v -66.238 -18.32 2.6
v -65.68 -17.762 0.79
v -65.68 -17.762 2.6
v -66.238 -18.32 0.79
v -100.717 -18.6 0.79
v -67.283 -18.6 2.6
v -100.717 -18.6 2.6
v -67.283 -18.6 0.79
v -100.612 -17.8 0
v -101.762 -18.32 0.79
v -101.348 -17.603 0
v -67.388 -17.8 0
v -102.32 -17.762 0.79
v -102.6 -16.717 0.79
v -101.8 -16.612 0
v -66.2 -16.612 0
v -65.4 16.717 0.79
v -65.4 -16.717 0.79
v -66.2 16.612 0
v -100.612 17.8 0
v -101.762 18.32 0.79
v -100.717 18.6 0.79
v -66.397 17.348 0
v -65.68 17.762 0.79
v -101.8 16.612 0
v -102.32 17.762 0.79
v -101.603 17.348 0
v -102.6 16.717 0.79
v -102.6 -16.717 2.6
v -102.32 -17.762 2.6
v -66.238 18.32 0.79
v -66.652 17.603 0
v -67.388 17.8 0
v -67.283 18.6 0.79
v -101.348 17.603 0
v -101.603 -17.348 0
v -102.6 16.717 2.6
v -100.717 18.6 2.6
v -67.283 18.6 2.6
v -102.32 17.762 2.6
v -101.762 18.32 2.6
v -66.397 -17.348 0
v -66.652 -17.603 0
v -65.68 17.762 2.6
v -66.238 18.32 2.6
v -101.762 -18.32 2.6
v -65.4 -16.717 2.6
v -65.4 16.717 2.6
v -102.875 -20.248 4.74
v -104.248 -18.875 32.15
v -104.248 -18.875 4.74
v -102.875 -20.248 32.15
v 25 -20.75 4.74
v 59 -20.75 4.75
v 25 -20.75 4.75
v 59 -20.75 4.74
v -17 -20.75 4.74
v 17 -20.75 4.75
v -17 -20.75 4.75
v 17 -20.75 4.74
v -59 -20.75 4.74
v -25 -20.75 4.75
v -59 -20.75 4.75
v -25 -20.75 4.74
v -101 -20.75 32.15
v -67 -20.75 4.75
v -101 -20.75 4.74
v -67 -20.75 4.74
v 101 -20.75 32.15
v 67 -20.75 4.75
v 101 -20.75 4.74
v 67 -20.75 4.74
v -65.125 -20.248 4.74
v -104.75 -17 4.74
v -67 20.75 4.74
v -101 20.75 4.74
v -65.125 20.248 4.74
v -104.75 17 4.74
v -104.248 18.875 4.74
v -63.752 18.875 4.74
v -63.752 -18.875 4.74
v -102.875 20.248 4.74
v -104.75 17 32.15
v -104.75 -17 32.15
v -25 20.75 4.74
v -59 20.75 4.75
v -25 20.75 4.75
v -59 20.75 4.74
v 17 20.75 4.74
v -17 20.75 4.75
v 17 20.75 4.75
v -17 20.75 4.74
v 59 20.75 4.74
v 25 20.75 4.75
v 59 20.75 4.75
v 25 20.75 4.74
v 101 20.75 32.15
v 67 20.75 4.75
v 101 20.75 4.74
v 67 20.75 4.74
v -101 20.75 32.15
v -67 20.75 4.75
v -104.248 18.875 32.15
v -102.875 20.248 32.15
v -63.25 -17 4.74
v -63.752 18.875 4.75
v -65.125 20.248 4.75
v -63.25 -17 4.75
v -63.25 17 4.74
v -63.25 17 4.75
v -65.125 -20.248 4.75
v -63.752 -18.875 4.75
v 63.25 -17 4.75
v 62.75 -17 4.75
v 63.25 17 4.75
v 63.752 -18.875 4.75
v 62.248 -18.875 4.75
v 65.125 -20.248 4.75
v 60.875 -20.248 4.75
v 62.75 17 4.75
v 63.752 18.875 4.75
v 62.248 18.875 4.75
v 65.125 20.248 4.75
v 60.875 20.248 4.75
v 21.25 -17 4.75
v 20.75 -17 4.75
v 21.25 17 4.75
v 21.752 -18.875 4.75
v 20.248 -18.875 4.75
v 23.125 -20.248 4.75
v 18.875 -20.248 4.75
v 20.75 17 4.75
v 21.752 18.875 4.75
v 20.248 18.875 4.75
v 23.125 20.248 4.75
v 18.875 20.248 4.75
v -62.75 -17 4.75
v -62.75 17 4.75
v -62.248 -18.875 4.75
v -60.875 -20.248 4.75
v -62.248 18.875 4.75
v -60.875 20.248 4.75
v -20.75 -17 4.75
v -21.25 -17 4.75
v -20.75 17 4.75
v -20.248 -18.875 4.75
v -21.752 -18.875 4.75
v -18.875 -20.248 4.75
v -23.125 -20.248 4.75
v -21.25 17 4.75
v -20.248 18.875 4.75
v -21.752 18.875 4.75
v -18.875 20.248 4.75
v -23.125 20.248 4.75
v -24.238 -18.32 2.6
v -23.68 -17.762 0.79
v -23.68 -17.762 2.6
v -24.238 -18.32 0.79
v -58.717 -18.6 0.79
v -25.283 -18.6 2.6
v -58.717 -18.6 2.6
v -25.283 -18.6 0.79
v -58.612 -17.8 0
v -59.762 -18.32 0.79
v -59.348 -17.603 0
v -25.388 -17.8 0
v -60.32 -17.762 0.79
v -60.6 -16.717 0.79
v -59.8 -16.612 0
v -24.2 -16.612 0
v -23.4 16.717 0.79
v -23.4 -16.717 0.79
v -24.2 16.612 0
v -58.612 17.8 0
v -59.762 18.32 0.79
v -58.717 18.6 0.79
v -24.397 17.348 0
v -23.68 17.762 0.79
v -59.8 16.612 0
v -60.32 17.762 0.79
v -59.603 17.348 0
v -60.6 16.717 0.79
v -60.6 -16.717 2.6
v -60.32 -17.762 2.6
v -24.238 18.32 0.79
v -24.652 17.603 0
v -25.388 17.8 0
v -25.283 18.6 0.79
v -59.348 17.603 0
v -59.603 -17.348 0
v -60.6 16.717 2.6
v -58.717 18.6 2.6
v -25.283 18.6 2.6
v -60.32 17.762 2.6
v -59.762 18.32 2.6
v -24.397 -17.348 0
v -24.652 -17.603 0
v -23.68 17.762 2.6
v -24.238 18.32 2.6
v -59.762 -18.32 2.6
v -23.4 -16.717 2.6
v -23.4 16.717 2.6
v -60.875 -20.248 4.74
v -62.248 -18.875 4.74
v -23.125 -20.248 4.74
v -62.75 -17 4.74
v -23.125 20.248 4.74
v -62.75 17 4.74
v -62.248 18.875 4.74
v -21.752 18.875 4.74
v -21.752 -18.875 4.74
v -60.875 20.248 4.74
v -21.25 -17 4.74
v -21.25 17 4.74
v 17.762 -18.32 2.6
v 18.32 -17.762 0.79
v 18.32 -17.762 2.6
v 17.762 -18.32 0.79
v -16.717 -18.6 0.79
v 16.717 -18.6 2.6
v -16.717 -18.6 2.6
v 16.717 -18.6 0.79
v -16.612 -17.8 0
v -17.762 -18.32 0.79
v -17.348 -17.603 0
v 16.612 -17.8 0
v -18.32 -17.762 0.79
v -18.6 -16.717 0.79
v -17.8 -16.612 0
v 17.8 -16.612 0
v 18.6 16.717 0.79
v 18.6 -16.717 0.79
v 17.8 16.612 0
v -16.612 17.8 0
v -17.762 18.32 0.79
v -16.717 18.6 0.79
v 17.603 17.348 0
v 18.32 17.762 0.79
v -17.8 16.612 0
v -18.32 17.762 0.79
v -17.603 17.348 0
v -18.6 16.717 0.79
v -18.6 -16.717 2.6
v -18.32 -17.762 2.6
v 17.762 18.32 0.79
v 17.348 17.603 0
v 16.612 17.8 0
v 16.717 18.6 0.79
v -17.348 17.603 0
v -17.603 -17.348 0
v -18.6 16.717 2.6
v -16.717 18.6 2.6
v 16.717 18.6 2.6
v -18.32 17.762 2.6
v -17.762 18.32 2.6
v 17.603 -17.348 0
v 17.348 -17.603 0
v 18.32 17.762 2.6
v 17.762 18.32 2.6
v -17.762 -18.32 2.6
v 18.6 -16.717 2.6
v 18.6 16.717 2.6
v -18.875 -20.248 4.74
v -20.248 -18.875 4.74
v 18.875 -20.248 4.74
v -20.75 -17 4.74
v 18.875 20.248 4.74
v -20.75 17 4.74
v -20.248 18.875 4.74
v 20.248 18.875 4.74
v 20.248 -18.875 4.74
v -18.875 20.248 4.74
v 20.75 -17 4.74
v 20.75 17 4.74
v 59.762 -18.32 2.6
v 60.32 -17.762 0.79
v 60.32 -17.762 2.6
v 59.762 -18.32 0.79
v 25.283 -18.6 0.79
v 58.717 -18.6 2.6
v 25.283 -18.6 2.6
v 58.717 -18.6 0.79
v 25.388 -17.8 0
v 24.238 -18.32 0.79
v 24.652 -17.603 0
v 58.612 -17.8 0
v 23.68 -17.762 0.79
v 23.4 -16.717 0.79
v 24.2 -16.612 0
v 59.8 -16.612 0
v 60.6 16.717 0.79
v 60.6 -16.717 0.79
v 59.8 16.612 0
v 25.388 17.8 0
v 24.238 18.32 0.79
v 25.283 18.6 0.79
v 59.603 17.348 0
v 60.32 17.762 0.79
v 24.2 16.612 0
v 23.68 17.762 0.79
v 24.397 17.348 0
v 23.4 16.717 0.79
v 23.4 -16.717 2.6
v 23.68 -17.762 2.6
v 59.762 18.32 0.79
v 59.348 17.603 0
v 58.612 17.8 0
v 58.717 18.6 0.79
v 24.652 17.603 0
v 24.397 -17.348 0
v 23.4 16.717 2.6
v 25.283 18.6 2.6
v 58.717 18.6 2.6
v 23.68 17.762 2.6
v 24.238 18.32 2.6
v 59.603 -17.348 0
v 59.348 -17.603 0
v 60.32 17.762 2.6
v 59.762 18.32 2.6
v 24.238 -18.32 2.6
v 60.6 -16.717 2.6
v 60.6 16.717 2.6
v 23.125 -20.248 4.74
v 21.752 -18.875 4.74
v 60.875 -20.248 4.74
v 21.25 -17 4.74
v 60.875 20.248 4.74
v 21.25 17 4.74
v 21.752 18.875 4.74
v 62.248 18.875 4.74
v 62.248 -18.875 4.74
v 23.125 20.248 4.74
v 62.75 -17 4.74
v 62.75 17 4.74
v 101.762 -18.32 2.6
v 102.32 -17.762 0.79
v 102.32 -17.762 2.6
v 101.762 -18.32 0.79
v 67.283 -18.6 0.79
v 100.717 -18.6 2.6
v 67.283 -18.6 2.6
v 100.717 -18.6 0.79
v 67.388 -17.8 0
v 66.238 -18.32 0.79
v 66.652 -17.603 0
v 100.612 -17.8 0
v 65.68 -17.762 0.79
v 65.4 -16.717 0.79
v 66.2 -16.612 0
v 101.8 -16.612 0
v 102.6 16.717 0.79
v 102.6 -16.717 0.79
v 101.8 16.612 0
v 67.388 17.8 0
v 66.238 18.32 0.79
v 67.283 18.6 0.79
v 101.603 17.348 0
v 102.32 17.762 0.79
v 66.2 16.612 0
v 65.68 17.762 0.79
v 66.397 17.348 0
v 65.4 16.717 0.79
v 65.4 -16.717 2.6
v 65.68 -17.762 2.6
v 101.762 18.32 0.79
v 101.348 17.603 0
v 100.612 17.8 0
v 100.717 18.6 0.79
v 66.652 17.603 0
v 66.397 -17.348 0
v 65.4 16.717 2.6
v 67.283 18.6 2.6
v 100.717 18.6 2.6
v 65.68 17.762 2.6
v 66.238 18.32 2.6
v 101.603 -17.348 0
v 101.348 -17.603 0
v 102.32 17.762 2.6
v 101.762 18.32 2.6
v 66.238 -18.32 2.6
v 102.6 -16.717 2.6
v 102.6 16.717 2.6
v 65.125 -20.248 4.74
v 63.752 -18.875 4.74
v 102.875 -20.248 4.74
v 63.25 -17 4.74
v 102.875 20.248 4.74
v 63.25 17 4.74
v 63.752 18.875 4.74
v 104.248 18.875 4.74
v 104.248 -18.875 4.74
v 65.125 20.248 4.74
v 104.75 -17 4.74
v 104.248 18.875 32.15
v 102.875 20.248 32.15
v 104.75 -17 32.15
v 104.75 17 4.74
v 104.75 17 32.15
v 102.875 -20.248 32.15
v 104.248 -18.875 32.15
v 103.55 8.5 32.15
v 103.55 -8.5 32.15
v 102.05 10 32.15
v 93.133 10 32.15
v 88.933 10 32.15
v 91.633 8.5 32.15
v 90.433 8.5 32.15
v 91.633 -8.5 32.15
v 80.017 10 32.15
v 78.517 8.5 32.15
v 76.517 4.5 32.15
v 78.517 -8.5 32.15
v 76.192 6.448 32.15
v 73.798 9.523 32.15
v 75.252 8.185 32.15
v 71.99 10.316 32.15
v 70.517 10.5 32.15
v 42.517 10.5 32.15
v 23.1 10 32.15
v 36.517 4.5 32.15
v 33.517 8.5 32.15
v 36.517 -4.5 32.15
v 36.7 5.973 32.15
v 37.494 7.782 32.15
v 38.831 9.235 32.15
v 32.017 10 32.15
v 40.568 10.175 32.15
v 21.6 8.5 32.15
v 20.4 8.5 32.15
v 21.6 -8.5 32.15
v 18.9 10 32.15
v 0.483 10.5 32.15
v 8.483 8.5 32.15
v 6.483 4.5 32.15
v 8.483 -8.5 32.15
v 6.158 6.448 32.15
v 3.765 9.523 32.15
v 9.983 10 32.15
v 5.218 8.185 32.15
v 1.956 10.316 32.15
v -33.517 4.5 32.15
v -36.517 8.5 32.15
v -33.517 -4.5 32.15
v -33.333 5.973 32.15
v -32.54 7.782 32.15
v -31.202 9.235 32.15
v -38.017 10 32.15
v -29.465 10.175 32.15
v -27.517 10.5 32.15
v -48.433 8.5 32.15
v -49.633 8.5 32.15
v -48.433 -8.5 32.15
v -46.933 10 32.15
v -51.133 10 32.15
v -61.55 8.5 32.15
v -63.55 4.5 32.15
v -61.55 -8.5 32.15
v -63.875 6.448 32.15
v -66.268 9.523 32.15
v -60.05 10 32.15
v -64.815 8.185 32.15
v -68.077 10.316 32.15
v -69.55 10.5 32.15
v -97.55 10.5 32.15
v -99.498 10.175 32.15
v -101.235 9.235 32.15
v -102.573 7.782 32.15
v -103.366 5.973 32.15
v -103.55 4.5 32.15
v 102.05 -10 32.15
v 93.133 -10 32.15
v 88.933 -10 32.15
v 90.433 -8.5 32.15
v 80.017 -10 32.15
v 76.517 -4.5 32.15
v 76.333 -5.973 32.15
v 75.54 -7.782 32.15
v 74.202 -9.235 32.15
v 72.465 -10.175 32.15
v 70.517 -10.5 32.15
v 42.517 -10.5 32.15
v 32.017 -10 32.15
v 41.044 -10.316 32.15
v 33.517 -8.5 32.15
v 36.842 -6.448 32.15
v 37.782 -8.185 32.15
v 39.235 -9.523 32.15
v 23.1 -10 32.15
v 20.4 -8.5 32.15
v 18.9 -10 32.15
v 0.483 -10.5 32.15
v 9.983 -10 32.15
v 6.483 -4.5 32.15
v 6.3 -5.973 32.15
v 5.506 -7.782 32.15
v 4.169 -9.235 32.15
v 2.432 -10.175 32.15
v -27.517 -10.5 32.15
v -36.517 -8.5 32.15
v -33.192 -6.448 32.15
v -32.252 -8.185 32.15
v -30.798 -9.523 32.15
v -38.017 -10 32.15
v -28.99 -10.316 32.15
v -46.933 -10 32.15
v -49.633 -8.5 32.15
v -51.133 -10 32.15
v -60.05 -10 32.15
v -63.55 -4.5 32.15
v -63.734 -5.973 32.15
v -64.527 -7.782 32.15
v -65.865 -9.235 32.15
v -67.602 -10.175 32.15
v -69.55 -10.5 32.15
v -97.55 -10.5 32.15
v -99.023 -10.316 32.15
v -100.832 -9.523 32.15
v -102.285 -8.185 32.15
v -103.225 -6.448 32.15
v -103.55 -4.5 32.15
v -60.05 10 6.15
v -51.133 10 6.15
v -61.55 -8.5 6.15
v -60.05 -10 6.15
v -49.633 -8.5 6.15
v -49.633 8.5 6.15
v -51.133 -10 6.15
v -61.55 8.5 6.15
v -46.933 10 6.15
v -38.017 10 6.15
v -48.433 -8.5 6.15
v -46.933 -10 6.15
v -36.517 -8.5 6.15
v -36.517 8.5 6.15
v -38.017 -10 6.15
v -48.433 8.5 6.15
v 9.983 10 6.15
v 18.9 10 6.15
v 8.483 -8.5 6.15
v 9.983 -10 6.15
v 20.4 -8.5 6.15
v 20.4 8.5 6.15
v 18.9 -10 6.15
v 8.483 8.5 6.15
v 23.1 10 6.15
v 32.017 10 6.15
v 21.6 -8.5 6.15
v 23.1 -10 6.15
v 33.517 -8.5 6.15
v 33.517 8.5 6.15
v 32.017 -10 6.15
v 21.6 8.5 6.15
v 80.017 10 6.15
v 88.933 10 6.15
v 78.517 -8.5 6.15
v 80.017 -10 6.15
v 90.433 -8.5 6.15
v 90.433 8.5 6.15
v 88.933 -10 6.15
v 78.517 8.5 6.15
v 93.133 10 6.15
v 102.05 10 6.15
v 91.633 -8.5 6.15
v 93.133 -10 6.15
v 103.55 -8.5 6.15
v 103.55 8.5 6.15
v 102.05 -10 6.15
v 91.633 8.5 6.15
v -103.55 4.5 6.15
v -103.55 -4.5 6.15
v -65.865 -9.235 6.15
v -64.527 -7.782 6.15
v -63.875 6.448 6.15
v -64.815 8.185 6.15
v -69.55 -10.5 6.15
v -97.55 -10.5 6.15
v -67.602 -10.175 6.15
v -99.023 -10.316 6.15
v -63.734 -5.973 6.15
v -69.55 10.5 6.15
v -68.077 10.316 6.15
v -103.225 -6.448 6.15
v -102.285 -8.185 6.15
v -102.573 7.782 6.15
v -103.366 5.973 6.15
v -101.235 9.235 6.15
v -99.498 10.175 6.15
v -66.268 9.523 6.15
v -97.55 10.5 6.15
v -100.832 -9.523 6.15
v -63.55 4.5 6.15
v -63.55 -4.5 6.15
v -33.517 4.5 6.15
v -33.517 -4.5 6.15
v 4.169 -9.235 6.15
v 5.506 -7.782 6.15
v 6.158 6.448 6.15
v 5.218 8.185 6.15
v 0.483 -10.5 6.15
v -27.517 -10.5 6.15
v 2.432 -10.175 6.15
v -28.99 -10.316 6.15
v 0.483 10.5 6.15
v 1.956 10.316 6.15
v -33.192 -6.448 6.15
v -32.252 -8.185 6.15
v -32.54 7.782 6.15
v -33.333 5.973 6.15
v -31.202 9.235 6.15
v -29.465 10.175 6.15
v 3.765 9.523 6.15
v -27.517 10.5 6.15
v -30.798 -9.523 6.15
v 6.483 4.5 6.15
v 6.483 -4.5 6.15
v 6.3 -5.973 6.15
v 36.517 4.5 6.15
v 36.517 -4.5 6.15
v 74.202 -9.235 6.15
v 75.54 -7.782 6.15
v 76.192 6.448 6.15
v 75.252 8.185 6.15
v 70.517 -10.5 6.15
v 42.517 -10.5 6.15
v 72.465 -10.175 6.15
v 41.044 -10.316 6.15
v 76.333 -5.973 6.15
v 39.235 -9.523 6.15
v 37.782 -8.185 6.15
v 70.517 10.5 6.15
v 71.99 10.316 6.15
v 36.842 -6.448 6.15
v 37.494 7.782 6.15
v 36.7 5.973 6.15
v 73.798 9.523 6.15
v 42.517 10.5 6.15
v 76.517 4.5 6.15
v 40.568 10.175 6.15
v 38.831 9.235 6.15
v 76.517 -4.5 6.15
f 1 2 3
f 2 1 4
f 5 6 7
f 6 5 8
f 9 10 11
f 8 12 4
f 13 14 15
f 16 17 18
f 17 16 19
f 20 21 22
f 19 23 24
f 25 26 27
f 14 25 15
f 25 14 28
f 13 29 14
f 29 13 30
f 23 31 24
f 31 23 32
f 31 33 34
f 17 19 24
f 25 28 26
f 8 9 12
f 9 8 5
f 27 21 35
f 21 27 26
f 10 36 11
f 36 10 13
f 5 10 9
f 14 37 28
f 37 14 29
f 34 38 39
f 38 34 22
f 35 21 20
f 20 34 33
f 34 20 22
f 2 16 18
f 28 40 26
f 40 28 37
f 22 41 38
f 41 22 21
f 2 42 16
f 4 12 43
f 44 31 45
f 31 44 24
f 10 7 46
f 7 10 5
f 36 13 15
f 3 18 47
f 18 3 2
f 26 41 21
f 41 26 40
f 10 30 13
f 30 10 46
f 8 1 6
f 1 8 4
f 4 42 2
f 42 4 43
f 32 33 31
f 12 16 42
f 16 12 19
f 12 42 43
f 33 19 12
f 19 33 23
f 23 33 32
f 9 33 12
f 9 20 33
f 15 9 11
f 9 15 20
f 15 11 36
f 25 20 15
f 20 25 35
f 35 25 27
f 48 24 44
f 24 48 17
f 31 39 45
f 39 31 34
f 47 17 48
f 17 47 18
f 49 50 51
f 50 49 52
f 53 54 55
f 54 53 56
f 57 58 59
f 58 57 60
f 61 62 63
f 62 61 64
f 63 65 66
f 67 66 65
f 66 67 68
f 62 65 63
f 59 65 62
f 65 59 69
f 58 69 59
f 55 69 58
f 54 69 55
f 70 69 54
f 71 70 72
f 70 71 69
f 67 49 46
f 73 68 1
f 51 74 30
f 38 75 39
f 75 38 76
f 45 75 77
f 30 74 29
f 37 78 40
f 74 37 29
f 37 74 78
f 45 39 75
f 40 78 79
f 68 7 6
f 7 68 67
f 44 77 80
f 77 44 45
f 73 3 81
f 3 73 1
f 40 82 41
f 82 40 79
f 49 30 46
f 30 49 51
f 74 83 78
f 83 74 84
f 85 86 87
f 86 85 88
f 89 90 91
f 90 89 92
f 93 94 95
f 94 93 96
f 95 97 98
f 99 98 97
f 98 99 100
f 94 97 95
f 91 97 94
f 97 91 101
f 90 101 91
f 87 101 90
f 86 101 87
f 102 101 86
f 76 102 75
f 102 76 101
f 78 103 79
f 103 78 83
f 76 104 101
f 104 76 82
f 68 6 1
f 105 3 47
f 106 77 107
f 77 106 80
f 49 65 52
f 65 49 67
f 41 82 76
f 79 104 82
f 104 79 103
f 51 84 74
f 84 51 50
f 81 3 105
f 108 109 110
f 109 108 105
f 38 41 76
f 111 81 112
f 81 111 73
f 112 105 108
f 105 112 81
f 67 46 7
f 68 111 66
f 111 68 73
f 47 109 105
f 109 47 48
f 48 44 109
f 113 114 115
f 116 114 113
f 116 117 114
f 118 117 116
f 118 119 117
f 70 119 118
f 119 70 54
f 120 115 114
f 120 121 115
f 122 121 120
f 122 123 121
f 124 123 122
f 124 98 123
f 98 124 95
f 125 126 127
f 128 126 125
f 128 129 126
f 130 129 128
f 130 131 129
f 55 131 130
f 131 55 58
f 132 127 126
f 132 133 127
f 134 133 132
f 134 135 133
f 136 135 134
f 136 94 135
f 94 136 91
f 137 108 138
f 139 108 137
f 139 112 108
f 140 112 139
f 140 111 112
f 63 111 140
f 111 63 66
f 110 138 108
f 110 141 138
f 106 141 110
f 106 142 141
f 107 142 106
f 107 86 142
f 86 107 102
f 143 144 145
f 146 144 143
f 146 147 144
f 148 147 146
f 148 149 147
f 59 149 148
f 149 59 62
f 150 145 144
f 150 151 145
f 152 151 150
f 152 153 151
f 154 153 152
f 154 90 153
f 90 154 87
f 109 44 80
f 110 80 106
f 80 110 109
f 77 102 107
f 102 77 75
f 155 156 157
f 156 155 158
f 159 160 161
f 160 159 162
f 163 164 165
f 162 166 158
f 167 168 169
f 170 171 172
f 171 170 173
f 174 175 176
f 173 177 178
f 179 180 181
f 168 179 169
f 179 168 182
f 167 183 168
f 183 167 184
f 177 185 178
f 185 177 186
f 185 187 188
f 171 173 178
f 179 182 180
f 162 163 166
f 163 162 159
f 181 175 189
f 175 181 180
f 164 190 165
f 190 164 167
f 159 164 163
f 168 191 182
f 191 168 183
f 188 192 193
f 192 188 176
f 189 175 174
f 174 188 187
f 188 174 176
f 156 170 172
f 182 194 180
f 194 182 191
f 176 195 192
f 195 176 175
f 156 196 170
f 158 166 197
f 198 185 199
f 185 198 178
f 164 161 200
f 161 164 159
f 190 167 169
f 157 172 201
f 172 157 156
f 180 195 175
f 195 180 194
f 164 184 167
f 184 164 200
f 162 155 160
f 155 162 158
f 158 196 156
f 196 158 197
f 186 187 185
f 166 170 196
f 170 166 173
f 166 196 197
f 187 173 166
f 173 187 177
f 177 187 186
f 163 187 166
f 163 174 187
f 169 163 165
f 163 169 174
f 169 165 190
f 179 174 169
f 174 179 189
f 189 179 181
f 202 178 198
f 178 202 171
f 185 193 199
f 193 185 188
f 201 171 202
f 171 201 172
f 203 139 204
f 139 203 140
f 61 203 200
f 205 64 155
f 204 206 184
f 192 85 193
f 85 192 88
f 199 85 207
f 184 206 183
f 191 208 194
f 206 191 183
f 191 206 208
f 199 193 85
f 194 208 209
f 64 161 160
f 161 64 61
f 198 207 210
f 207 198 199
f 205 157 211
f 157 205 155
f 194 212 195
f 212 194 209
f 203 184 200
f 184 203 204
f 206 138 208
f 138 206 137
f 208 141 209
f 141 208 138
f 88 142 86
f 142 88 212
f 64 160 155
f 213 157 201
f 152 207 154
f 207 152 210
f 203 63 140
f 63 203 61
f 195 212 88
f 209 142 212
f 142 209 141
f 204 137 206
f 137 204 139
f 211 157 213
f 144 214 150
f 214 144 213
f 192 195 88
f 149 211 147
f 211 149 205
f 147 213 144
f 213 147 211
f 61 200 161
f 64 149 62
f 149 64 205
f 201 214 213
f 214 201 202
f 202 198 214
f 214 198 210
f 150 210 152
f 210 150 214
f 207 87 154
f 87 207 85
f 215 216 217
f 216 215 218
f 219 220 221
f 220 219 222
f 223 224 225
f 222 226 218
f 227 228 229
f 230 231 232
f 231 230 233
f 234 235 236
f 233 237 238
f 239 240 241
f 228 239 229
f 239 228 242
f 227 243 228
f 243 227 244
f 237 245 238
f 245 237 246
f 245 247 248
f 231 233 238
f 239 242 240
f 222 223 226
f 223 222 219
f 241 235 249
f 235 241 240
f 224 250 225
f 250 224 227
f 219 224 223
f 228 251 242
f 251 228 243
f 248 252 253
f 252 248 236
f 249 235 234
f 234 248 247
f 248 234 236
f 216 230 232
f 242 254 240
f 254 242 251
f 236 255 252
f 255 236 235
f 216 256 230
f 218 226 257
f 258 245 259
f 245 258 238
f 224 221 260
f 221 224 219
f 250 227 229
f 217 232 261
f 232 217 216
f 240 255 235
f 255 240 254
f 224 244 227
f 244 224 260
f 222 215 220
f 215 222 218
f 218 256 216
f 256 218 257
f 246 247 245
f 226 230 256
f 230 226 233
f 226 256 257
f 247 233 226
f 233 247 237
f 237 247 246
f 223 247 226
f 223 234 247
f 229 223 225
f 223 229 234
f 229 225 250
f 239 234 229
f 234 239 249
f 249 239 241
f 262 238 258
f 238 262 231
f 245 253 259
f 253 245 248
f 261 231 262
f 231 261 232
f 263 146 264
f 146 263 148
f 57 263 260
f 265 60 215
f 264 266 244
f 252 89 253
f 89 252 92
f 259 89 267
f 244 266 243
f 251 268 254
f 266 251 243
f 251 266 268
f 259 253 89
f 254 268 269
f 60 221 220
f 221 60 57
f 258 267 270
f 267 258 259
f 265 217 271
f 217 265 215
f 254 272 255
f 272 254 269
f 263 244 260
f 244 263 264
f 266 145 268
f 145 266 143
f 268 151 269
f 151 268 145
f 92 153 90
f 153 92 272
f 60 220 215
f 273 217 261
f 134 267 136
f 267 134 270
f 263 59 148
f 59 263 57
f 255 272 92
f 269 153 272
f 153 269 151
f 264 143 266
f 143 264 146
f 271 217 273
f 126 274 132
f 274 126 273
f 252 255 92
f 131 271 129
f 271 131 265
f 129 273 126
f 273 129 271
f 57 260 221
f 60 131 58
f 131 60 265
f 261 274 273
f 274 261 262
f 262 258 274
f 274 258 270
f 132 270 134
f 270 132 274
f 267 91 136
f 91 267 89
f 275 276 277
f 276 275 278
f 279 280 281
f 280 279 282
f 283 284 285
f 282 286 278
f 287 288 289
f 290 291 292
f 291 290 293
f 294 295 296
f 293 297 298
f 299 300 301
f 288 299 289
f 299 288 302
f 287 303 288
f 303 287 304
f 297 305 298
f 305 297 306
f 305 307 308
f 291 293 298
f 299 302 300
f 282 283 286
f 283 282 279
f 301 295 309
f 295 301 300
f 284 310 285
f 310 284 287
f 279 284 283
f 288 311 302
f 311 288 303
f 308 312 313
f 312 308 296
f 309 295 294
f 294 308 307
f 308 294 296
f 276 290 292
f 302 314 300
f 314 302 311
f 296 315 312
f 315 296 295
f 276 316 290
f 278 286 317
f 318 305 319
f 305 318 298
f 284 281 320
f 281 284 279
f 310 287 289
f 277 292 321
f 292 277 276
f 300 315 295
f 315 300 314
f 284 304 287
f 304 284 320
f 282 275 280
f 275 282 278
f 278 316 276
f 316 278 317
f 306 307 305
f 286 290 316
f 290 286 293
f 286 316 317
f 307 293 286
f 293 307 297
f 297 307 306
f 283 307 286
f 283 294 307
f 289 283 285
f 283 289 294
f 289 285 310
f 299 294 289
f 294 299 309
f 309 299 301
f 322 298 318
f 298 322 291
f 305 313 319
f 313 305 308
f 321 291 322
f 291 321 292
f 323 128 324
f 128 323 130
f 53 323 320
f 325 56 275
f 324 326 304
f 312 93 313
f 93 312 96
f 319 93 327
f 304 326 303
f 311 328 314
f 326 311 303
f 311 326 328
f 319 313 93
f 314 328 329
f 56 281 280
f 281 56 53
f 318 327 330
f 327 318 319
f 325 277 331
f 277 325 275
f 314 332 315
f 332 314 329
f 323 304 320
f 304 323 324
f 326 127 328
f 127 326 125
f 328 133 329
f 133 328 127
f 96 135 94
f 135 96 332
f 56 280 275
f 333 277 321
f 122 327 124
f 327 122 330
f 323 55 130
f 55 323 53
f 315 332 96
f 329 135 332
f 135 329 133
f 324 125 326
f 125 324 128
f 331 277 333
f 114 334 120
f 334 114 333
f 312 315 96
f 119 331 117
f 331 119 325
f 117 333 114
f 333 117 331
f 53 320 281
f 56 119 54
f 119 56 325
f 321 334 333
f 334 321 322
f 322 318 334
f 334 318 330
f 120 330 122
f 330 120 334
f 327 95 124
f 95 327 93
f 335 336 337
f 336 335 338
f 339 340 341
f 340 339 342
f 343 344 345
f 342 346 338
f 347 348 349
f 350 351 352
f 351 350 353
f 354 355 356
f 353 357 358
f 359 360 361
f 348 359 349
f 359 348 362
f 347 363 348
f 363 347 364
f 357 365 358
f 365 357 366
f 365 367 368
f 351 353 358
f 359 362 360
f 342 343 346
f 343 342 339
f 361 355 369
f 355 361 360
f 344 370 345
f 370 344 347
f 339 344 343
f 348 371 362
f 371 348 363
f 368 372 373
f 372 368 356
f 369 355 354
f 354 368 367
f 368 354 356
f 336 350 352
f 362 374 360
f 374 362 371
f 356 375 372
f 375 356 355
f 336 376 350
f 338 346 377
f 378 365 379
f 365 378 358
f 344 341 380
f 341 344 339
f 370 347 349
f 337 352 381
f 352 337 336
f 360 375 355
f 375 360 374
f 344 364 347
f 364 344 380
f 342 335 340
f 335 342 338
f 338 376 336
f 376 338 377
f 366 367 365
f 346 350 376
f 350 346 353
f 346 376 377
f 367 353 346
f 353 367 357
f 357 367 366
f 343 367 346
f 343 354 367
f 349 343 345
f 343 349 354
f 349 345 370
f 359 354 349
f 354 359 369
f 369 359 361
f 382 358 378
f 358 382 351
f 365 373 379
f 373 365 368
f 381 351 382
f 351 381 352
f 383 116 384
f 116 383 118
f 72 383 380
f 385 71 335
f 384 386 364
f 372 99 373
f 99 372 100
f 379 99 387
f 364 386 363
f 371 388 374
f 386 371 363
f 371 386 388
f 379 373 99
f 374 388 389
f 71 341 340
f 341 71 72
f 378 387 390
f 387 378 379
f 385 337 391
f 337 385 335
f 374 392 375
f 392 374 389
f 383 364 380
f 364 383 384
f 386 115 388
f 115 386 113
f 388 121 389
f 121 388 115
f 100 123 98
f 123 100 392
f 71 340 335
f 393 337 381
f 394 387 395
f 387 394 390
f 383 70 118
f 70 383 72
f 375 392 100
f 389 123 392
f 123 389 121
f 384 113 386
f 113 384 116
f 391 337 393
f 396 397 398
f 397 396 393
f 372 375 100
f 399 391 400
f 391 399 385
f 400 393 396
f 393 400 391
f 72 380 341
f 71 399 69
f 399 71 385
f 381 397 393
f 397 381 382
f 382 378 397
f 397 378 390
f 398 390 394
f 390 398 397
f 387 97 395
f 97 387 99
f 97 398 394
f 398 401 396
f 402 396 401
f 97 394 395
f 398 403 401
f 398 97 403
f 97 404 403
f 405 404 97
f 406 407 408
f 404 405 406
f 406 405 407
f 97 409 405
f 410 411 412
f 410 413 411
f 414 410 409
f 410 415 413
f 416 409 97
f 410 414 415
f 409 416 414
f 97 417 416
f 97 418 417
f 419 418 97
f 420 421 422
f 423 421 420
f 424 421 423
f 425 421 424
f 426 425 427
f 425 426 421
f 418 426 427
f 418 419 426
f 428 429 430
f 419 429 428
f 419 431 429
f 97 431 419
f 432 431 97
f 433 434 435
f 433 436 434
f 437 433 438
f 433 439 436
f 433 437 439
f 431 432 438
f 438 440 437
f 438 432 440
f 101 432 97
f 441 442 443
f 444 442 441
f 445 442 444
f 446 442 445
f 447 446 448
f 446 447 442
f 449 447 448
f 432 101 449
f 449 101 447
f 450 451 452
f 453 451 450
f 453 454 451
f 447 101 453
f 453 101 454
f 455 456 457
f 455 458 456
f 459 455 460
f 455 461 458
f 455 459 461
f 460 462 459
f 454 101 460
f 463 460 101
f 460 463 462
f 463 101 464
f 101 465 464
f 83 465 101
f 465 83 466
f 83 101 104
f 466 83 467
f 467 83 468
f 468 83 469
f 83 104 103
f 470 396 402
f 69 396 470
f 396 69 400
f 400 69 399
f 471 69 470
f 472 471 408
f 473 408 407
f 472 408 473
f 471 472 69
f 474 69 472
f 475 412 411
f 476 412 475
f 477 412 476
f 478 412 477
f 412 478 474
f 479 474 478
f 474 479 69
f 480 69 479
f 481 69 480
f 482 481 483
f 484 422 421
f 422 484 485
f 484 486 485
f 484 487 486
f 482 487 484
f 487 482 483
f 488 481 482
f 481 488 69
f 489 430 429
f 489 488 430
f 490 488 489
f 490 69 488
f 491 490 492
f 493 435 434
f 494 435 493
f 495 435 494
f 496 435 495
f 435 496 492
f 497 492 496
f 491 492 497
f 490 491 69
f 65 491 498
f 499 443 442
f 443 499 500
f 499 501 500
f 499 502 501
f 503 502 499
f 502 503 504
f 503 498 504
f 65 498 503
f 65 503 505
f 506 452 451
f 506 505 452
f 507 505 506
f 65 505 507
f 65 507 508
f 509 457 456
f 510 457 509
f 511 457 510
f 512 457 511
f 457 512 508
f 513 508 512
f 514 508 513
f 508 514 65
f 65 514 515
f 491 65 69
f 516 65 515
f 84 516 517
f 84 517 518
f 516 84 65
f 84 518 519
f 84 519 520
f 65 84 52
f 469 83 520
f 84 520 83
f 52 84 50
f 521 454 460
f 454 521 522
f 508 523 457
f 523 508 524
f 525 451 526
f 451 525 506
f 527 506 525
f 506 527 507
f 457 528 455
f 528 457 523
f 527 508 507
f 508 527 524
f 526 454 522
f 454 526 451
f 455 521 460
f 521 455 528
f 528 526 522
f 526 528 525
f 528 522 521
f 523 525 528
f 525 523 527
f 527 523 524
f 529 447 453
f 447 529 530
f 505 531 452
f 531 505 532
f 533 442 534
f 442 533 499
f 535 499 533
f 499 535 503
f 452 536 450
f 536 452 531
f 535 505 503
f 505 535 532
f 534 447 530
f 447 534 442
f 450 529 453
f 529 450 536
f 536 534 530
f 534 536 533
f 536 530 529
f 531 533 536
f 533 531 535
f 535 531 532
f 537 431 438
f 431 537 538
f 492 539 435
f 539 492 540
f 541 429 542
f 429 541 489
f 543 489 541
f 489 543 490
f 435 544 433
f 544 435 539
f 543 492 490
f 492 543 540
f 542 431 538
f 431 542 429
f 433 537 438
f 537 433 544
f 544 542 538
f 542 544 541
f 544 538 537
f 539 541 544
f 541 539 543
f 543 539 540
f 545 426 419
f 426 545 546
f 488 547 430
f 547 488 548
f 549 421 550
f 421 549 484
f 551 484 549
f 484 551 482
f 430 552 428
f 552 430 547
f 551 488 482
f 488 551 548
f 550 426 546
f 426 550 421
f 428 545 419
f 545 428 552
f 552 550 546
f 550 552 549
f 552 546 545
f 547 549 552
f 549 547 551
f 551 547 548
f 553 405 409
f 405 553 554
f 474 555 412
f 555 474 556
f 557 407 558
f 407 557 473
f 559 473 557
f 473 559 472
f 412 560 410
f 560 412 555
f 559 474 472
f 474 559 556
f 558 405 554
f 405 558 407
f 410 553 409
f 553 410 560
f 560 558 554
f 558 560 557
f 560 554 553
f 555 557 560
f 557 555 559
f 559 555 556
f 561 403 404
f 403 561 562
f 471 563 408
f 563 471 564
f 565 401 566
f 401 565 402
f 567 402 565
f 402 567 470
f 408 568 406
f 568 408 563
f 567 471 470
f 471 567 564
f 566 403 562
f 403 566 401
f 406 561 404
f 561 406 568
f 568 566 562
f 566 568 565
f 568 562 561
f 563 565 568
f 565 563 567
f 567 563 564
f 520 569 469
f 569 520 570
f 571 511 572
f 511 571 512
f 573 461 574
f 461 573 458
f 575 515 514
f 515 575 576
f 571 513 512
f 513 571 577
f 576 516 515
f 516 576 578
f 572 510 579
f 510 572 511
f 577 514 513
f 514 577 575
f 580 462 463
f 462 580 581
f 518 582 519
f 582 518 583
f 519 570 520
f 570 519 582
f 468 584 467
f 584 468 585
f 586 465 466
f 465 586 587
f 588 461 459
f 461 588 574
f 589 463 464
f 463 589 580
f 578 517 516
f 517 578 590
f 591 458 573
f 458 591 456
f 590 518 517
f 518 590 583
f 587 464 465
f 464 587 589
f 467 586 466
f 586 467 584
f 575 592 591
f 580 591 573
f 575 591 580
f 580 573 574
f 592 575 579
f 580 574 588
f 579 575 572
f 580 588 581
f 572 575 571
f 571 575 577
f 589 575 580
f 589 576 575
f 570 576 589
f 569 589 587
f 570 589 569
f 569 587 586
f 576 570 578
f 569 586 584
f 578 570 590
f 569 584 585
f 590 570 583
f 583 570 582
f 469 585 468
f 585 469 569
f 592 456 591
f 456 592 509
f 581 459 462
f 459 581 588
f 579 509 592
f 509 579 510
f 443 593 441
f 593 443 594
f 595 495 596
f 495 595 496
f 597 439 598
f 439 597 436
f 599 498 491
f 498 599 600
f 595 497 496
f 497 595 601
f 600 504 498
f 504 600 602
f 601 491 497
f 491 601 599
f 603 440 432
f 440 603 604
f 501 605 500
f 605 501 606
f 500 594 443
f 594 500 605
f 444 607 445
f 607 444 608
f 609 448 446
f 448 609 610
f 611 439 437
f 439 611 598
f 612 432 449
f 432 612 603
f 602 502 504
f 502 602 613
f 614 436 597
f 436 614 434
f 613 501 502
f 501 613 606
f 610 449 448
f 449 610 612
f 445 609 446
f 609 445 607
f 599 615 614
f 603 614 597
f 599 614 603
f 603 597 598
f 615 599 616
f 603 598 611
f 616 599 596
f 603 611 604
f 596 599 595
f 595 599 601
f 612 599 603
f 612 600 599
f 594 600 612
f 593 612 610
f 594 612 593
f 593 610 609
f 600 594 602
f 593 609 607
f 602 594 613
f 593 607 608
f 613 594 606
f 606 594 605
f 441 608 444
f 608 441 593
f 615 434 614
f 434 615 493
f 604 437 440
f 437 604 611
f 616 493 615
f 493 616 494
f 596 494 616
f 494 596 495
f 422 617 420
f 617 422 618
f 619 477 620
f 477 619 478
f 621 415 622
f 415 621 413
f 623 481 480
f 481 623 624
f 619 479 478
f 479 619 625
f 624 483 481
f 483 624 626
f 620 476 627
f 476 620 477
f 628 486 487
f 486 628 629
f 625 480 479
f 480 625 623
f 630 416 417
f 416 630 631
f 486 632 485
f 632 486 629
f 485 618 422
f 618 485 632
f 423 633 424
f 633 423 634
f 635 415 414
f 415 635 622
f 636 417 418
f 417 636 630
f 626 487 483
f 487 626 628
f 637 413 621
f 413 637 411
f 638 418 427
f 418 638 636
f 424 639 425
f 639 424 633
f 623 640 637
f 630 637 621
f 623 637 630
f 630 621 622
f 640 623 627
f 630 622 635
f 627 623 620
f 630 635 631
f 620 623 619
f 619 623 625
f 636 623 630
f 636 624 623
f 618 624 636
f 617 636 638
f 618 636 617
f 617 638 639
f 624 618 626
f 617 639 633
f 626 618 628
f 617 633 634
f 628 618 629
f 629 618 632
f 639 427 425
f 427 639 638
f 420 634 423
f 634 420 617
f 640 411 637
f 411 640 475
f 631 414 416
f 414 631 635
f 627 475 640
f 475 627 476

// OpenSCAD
// file: ../lib/vessel.scad
// SPDX-License-Identifier: MIT
// Copyright (c) 2026 Aaron Cupp
//
// vessel.scad — parametric collar cups for bottles, cans, and pen-form tools.
//
// A collar cup is a solid Gridfinity block with cylindrical bores sunk into it.
// It LOCATES a vessel; it does not clamp one. That distinction is the whole
// design: a collar that grips harder than the bin weighs comes out of the
// baseplate with the bottle when you grab it one-handed. Clearance, not
// interference — CLR is per-diameter, not per-side.
//
// Capture depth is roughly a third of the vessel's height. Enough to resist a
// knock (this bench sits under a 180 W fume-extractor intake), not so much that
// you're fishing the bottle out.
//
//   collar_cup(nx, ny, vessel_d, capture_h, …)   — one centred bore
//   collar_cup_multi(nx, ny, bores, capture_h, …) — bores = [[x, y, d], …]
//
// Cord slot: pen-form tools that stand in a cup are usually corded (the HARDELL
// rotary tool takes a barrel jack). Without a slot the lead drapes over the rim
// and levers the tool sideways. `cord_w > 0` cuts a channel from the bore out
// through the wall, open to the top.

include <gridfinity.scad>

CLR      = 1.0;   // bore = vessel_d + CLR. Loose on purpose — see above.
MIN_WALL = 1.2;   // minimum material between two bores, and bore to outer face

// ---- geometry guards ----
// Overlapping bores and bores that break out through the side wall both still
// render as perfectly watertight, 2-manifold meshes — CI cannot tell you the
// part is wrong, only that it is closed. These asserts encode the intent that
// the mesh check can't. Cheap, and they fire at render time rather than on the
// printer.
function _pair_gaps(bores, clr) = [
    for (i = [0 : len(bores)-1], j = [0 : len(bores)-1]) if (i < j)
        norm([bores[i][0]-bores[j][0], bores[i][1]-bores[j][1]])
        - (bores[i][2]+clr)/2 - (bores[j][2]+clr)/2
];
function _edge_gaps(bores, clr, W, D) = [
    for (b = bores) min(W/2 - abs(b[0]) - (b[2]+clr)/2,
                        D/2 - abs(b[1]) - (b[2]+clr)/2)
];

// Multi-bore block. Bores are [x, y, diameter] in mm, relative to the block centre.
module collar_cup_multi(nx, ny, bores, capture_h, floor = 1.4, clr = CLR,
                        cord_w = 0, cord_at = 0, min_wall = MIN_WALL) {
    h = BIN_BASE_H + floor + capture_h;
    e = 0.1;
    W = nx*GF - 0.5; D = ny*GF - 0.5;
    _pg = _pair_gaps(bores, clr);
    _eg = _edge_gaps(bores, clr, W, D);
    assert(len(_pg) == 0 || min(_pg) >= min_wall,
           "collar_cup: bores are too close — they would merge into one pocket");
    assert(min(_eg) >= min_wall,
           "collar_cup: a bore breaches the outer wall — block needs more units");
    difference() {
        bin_blank(nx, ny, h);
        for (b = bores)
            translate([b[0], b[1], BIN_BASE_H + floor])
                cylinder(d = b[2] + clr, h = capture_h + e, $fn = 96);
        // Cord channel: from the first bore outward through the +X wall, open to
        // the rim so the lead drops in from above rather than threading.
        if (cord_w > 0)
            translate([bores[0][0], bores[0][1] - cord_w/2, BIN_BASE_H + floor + cord_at])
                cube([nx*GF, cord_w, h]);
    }
}

// Single centred bore — the common case.
module collar_cup(nx, ny, vessel_d, capture_h, floor = 1.4, clr = CLR,
                  cord_w = 0, cord_at = 0, min_wall = MIN_WALL) {
    collar_cup_multi(nx, ny, [[0, 0, vessel_d]], capture_h, floor, clr,
                     cord_w, cord_at, min_wall);
}

// Evenly spaced row of same-depth bores along X — for a rank of aerosol cans.
// Returns geometry, not a list; pass the diameters and it lays them out on the
// block's centre line.
module collar_cup_row(nx, ny, diameters, capture_h, floor = 1.4, clr = CLR,
                      min_wall = MIN_WALL) {
    n = len(diameters);
    pitch = nx * GF / n;
    collar_cup_multi(nx, ny,
        [for (i = [0 : n-1]) [(i - (n-1)/2) * pitch, 0, diameters[i]]],
        capture_h, floor, clr, 0, 0, min_wall);
}
// file: cleaning_station_common.scad
// cleaning_station_common.scad — shared parameters for the bench cleaning station.
//
// The IPA / contact-cleaner corner of the electronics repair bench. Everything
// here is measured off the actual items with calipers; nothing is a nominal from
// a product page. Diameters carry a per-diameter clearance (lib/vessel.scad CLR),
// not per-side.
//
// This corner sits under a fume-extractor intake, which drives two decisions:
//   * Cups CAPTURE the vessel rather than clamp it — a collar that grips harder
//     than the bin weighs lifts out of the baseplate with the bottle.
//   * Bins stay as low as the job allows. Capture velocity is decided in the
//     first six inches, and a wall of tall bins in front of the hood costs it.
//
// The aerosols are FLAMMABLE and this bench has a 400 °C iron on it. These cups
// are for working cans only; bulk stock belongs away from the hood entirely.
//
// SPDX-License-Identifier: CC-BY-NC-SA-4.0
// Copyright (c) 2026 Aaron Cupp

include <../lib/vessel.scad>

// ---- measured diameters (mm) ----
// DeoxIT bore: taken from the PART, not from a can measurement.
//
// The 2026-08-20 print had three bores — 57.00 / 55.20 / 52.75. The 57.00 fits a
// DeoxIT; 55.20 barely does; 52.75 holds nothing. So 57.00 is a validated bore,
// which beats re-deriving it from a can diameter plus a clearance guess. D5, F5
// and G5 are the same can, so one bore serves all three.
BORE_DEOXIT = 57.00;   // ✅ proven by the printed part

// Freeze spray is a DIFFERENT, LARGER can — 13 mm wider than a DeoxIT, which is
// why it never fitted a shared block.
D_FREEZE_SPRAY = 69.00;   // ✅ measured 2026-08-20 (was 56.00, badly wrong)
FREEZE_CLR     = 2.0;     // [1:0.5:4] -> 71.00 bore
FREEZE_MEASURED = true;

D_DISPENSER    = 53.50;   // 200 ml push-down alcohol pump, square base across flats
D_FLOOD_BOTTLE = 75.50;

// DeoxIT D100 / F100 / G100 concentrate droppers — bare bottles, out of their
// kit boxes. The boxes are a full 2×1 EACH; the three bare bottles share one.
// NOT ROUND — 39 × 20 is a flattened cross-section, not a diameter and a height.
D_DROPPER_L = 39.00;   // measured 2026-08-20, long axis of the footprint
D_DROPPER_W = 20.00;   // measured, short axis
DROPPER_CLR = 1.00;    // per dimension, matching the CLR convention
CAP_DROPPER = 26;      // [8:1:40] capture depth. ⚠️ bottle HEIGHT is unmeasured —
                       //   39 turned out to be a footprint, so the height nobody
                       //   has taken.
                       //   RAISED 15 → 26 on 2026-08-24: at 15 the brushes and
                       //   swabs fell over in their slots. Depth is what resists
                       //   an applicator tipping, and 15 mm of it on a ~100 mm
                       //   brush is almost none. 26 makes the whole block half
                       //   again as tall, which is what was asked for.
                       //   Read the bin_deoxit_droppers header before assuming
                       //   this alone fixes the tipping — it does not.

// ---- melamine sponges (mm) — 3.94 × 2.35 × 0.79 in ----
// Full block as sold. Bulk stock lives in the bag under the desk, ~100 of them;
// none of it competes for grid.
SPONGE_L = 100.1; SPONGE_W = 59.7; SPONGE_T = 20.1;

// WORKING size: a full block is far more sponge than any bench task needs, and
// melamine is consumed by abrasion — quartering one gets four uses out of what
// was one, and the smaller piece reaches between connectors where a 100 mm block
// cannot. Halve across, halve lengthwise.
CUT_L = SPONGE_L / 2;   // 50.05
CUT_W = SPONGE_W / 2;   // 29.85
CUT_T = SPONGE_T;       // 20.1 — unchanged, cuts are through the face

// ---- capture depth ----
// Vessel HEIGHTS were not measured, so this is a judgement call rather than a
// derived third-of-height: 50 mm resists a knock without making the bottles a
// two-handed retrieval. One number to change if the first print feels wrong.
CAPTURE = 50;

// Sponge bin: sponges stand ON EDGE (60 mm tall), ~4 across the 81 mm interior.
// On edge beats flat-stacked — same count in a 68 mm bin instead of a 107 mm one,
// and any sponge can be pinched out rather than peeling off the top of a pile.
// Height is set by a FULL block standing on edge, not a cut one — so one uncut
// block can still ride in the bin as reserve alongside the trimmed pieces.
// Cut pieces are 50 long, which is what lets the footprint drop to 2×2.
SPONGE_BIN_H = SPONGE_W + BIN_BASE_H + 1.4 + 2;   // ≈ 68
// main file
// bin_deoxit_droppers — 5×1 block: three DeoxIT concentrate droppers (D100 /
// F100 / G100) plus six slots for the brushes and swabs that come with them.
//
// THE BOTTLES ARE NOT ROUND. 39 × 20 is a flattened cross-section, and this part
// originally bored round 21 mm holes from it — the same mistake bin_dispenser
// made with the square alcohol pump. A measurement is a shape as well as a
// number; check which before choosing the cutter.
//
// Rounded rectangles rather than true ovals: an oval pocket only suits an oval
// bottle, a rounded rect accepts either. It locates the bottle, it need not
// trace it.
//
// The six applicator slots keep each product's brush and swab with its own
// bottle — D, F and G are different chemicals and a shared applicator carries
// one into the next.
//
// ⚠️ THE SLOTS ARE STILL OVERSIZED, AND DEPTH ALONE DOES NOT FIX THAT.
//
// The applicators fell over at CAP_DROPPER = 15, so it is now 26 and the block is
// half again as tall. That helps, but be clear about how much: a slot is
// 11.9 × 20 mm and nothing has ever put calipers on a brush handle. Assuming a
// 4 mm handle, the lean it can still take is
//
//       depth 15 → 27.8° across the slot, 46.8° along it
//       depth 26 → 16.9° across the slot, 31.6° along it
//
// Better, not fixed. The slots are sized from LEFTOVER SPACE, not from the thing
// going in them — they are whatever was between the bottle pockets. THE NUMBER
// THIS PART NEEDS is the handle diameter of a brush and of a swab, and how many
// of each ship with a bottle. With those the slot becomes handle + clearance and
// the lean goes to nothing; without them, more depth is the only lever and it is
// a weak one.
//
// PRINT: as emitted, feet down. No supports.
//
// SPDX-License-Identifier: CC-BY-NC-SA-4.0
// Copyright (c) 2026 Aaron Cupp
include <cleaning_station_common.scad>
include <../lib/gridfinity.scad>

NX = 5;
POCKET_L = D_DROPPER_L + DROPPER_CLR;   // 40
POCKET_W = D_DROPPER_W + DROPPER_CLR;   // 21
POCKET_R = 6.0;    // [2:0.5:9] pocket corner radius
GAP      = 1.5;    // [1.2:0.1:4] web between bottle pockets
SPLIT    = 3.0;    // [2:0.5:8] wall between the bottle bay and the slots
N_SLOT   = 6;      // [3:1:10] applicator slots
DIV      = 1.2;    // [1:0.2:3]
SLOT_D   = 20;     // [10:1:39] slot depth into the block (Y)
SLOT_R   = 1.5;    // [0:0.5:4]

WALL = 1.2; FLOOR = 1.4;
W = NX*GF - 0.5; D = 1*GF - 0.5;
IW = W - 2*WALL;  ID = D - 2*WALL;
H  = BIN_BASE_H + FLOOR + CAP_DROPPER;

// Layout is THREE GROUPS, each a bottle with its own two applicators beside it —
// not a bottle bay and a separate slot bay. Grouping means each product's brush
// and swab sit with its bottle, and the whole row lands in front of the matching
// spray can in the block behind. D, F and G are different chemicals; a shared
// applicator carries one into the next.
PG    = 2.0;   // [1.2:0.1:5] gap between a bottle pocket and its first slot
GG    = 3.0;   // [2:0.5:8] gap between groups

// group = pocket + gap + slot + divider + slot
SLOT_W = (IW - 2*GG - 3*(POCKET_L + PG + DIV)) / 6;
GROUP_W = POCKET_L + PG + 2*SLOT_W + DIV;

assert(SLOT_W >= 5, str("Applicator slots collapse to ", SLOT_W, " mm."));
assert(SLOT_D <= ID, "Slot is deeper than the block.");
echo(str("group ", GROUP_W, " mm = pocket ", POCKET_L, " + 2 slots of ", SLOT_W));

X0 = -IW/2;

difference() {
    bin_blank(NX, 1, H);
    for (g = [0 : 2]) {
        gx = X0 + g*(GROUP_W + GG);
        // the bottle
        translate([gx + POCKET_L/2, 0, BIN_BASE_H + FLOOR])
            linear_extrude(CAP_DROPPER + 0.1)
                offset(POCKET_R) offset(-POCKET_R)
                    square([POCKET_L, POCKET_W], center = true);
        // its two applicators
        for (i = [0, 1])
            translate([gx + POCKET_L + PG + SLOT_W/2 + i*(SLOT_W + DIV), 0,
                       BIN_BASE_H + FLOOR])
                linear_extrude(CAP_DROPPER + 0.1)
                    offset(SLOT_R) offset(-SLOT_R)
                        square([SLOT_W, SLOT_D], center = true);
    }
}
